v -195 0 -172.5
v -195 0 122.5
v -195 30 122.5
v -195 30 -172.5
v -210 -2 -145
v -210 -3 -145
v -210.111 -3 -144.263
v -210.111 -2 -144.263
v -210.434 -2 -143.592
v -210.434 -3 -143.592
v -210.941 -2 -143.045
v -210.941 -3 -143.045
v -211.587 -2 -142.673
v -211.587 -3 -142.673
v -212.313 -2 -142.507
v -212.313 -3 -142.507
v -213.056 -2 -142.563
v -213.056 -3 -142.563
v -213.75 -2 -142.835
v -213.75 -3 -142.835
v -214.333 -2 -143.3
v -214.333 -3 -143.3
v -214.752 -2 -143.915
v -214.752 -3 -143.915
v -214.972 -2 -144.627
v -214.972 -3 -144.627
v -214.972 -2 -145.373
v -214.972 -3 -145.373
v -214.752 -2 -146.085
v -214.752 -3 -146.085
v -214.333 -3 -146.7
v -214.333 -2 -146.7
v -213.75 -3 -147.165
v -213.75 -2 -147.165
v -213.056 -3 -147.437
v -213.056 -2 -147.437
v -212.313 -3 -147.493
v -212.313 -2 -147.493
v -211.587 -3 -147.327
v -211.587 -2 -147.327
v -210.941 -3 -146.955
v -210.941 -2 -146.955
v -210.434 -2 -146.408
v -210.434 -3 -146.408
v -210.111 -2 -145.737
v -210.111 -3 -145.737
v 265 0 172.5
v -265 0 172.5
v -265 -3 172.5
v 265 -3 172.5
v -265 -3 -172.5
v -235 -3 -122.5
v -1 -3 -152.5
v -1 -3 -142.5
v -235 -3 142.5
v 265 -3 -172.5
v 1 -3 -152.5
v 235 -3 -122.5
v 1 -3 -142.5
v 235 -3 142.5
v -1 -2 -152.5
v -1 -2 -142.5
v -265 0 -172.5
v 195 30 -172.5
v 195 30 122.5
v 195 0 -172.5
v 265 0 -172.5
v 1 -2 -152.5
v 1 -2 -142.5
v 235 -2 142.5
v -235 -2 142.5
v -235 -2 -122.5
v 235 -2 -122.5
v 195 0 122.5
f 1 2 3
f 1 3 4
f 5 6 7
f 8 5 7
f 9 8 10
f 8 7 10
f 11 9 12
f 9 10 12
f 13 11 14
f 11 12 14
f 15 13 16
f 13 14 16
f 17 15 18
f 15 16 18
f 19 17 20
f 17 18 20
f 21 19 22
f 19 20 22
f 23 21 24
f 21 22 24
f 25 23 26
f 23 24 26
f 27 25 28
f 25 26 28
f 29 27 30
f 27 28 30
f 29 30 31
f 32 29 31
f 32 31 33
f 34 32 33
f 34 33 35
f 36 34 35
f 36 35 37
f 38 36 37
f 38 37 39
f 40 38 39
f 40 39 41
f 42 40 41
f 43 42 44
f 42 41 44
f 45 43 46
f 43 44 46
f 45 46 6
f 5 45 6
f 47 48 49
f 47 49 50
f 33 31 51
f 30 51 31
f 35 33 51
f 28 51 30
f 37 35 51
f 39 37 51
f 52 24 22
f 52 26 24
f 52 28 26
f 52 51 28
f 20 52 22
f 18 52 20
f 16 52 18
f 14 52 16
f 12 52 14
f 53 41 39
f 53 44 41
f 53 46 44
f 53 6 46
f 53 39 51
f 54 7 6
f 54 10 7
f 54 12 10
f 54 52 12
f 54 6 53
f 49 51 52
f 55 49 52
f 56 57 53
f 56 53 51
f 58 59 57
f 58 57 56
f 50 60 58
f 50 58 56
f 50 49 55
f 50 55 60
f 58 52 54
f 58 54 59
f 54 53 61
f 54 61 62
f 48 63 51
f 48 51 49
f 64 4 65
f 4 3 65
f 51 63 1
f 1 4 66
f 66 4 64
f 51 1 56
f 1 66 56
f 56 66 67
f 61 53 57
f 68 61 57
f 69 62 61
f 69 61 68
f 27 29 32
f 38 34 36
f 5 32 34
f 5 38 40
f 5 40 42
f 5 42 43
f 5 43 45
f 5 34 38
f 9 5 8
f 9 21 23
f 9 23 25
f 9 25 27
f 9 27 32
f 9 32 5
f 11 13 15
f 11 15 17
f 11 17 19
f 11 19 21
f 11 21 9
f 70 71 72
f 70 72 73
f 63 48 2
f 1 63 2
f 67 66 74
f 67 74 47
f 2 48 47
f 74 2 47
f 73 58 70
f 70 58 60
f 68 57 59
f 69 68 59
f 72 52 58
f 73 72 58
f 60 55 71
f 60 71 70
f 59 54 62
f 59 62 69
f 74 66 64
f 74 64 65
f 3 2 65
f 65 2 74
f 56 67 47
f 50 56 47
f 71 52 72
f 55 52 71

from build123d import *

# Parameters (mm, degrees)
F0_W     = 530
F0_H     = 345
F0_R     = 2.5
F0_W_2   = 2
F0_H_2   = 10
F0_W_3   = 470
F0_H_3   = 265
F1_DEPTH = 3
F2_W     = 470
F2_H     = 265
F2_R     = 2.5
F2_W_2   = 2
F2_H_2   = 10
F3_DEPTH = 1
F4_W     = 390
F4_H     = 295
F4_H_2   = 245
F5_DEPTH = 30


with BuildPart() as f1:
    # F0 (on Front) → F1 (new body)
    with BuildSketch(Plane.XZ):
        Rectangle(F0_W, F0_H)
        with Locations((-212.5, -145)):
            Circle(F0_R, mode=Mode.SUBTRACT)
        with Locations((0, -147.5)):
            Rectangle(F0_W_2, F0_H_2, mode=Mode.SUBTRACT)
        with Locations((0, 10)):
            Rectangle(F0_W_3, F0_H_3, mode=Mode.SUBTRACT)
        with Locations((0, 10)):
            Rectangle(F0_W_3, F0_H_3)
        with Locations((0, -147.5)):
            Rectangle(F0_W_2, F0_H_2)
        with Locations((-212.5, -145)):
            Circle(F0_R)
    extrude(amount=F1_DEPTH)

    # F2 (on face) → F3 (cut)
    with BuildSketch(Plane.XZ.offset(3)):
        with Locations((0, 10)):
            Rectangle(F2_W, F2_H)
        with Locations((-212.5, -145)):
            Circle(F2_R)
        with Locations((0, -147.5)):
            Rectangle(F2_W_2, F2_H_2)
    extrude(amount=-F3_DEPTH, mode=Mode.SUBTRACT)

    # F4 (on face) → F5 (join)
    with BuildSketch(Plane.XZ):
        with Locations((0, -25)):
            Rectangle(F4_W, F4_H)
        Rectangle(F4_W, F4_H_2)
    extrude(amount=-F5_DEPTH)


solid = f1.part
